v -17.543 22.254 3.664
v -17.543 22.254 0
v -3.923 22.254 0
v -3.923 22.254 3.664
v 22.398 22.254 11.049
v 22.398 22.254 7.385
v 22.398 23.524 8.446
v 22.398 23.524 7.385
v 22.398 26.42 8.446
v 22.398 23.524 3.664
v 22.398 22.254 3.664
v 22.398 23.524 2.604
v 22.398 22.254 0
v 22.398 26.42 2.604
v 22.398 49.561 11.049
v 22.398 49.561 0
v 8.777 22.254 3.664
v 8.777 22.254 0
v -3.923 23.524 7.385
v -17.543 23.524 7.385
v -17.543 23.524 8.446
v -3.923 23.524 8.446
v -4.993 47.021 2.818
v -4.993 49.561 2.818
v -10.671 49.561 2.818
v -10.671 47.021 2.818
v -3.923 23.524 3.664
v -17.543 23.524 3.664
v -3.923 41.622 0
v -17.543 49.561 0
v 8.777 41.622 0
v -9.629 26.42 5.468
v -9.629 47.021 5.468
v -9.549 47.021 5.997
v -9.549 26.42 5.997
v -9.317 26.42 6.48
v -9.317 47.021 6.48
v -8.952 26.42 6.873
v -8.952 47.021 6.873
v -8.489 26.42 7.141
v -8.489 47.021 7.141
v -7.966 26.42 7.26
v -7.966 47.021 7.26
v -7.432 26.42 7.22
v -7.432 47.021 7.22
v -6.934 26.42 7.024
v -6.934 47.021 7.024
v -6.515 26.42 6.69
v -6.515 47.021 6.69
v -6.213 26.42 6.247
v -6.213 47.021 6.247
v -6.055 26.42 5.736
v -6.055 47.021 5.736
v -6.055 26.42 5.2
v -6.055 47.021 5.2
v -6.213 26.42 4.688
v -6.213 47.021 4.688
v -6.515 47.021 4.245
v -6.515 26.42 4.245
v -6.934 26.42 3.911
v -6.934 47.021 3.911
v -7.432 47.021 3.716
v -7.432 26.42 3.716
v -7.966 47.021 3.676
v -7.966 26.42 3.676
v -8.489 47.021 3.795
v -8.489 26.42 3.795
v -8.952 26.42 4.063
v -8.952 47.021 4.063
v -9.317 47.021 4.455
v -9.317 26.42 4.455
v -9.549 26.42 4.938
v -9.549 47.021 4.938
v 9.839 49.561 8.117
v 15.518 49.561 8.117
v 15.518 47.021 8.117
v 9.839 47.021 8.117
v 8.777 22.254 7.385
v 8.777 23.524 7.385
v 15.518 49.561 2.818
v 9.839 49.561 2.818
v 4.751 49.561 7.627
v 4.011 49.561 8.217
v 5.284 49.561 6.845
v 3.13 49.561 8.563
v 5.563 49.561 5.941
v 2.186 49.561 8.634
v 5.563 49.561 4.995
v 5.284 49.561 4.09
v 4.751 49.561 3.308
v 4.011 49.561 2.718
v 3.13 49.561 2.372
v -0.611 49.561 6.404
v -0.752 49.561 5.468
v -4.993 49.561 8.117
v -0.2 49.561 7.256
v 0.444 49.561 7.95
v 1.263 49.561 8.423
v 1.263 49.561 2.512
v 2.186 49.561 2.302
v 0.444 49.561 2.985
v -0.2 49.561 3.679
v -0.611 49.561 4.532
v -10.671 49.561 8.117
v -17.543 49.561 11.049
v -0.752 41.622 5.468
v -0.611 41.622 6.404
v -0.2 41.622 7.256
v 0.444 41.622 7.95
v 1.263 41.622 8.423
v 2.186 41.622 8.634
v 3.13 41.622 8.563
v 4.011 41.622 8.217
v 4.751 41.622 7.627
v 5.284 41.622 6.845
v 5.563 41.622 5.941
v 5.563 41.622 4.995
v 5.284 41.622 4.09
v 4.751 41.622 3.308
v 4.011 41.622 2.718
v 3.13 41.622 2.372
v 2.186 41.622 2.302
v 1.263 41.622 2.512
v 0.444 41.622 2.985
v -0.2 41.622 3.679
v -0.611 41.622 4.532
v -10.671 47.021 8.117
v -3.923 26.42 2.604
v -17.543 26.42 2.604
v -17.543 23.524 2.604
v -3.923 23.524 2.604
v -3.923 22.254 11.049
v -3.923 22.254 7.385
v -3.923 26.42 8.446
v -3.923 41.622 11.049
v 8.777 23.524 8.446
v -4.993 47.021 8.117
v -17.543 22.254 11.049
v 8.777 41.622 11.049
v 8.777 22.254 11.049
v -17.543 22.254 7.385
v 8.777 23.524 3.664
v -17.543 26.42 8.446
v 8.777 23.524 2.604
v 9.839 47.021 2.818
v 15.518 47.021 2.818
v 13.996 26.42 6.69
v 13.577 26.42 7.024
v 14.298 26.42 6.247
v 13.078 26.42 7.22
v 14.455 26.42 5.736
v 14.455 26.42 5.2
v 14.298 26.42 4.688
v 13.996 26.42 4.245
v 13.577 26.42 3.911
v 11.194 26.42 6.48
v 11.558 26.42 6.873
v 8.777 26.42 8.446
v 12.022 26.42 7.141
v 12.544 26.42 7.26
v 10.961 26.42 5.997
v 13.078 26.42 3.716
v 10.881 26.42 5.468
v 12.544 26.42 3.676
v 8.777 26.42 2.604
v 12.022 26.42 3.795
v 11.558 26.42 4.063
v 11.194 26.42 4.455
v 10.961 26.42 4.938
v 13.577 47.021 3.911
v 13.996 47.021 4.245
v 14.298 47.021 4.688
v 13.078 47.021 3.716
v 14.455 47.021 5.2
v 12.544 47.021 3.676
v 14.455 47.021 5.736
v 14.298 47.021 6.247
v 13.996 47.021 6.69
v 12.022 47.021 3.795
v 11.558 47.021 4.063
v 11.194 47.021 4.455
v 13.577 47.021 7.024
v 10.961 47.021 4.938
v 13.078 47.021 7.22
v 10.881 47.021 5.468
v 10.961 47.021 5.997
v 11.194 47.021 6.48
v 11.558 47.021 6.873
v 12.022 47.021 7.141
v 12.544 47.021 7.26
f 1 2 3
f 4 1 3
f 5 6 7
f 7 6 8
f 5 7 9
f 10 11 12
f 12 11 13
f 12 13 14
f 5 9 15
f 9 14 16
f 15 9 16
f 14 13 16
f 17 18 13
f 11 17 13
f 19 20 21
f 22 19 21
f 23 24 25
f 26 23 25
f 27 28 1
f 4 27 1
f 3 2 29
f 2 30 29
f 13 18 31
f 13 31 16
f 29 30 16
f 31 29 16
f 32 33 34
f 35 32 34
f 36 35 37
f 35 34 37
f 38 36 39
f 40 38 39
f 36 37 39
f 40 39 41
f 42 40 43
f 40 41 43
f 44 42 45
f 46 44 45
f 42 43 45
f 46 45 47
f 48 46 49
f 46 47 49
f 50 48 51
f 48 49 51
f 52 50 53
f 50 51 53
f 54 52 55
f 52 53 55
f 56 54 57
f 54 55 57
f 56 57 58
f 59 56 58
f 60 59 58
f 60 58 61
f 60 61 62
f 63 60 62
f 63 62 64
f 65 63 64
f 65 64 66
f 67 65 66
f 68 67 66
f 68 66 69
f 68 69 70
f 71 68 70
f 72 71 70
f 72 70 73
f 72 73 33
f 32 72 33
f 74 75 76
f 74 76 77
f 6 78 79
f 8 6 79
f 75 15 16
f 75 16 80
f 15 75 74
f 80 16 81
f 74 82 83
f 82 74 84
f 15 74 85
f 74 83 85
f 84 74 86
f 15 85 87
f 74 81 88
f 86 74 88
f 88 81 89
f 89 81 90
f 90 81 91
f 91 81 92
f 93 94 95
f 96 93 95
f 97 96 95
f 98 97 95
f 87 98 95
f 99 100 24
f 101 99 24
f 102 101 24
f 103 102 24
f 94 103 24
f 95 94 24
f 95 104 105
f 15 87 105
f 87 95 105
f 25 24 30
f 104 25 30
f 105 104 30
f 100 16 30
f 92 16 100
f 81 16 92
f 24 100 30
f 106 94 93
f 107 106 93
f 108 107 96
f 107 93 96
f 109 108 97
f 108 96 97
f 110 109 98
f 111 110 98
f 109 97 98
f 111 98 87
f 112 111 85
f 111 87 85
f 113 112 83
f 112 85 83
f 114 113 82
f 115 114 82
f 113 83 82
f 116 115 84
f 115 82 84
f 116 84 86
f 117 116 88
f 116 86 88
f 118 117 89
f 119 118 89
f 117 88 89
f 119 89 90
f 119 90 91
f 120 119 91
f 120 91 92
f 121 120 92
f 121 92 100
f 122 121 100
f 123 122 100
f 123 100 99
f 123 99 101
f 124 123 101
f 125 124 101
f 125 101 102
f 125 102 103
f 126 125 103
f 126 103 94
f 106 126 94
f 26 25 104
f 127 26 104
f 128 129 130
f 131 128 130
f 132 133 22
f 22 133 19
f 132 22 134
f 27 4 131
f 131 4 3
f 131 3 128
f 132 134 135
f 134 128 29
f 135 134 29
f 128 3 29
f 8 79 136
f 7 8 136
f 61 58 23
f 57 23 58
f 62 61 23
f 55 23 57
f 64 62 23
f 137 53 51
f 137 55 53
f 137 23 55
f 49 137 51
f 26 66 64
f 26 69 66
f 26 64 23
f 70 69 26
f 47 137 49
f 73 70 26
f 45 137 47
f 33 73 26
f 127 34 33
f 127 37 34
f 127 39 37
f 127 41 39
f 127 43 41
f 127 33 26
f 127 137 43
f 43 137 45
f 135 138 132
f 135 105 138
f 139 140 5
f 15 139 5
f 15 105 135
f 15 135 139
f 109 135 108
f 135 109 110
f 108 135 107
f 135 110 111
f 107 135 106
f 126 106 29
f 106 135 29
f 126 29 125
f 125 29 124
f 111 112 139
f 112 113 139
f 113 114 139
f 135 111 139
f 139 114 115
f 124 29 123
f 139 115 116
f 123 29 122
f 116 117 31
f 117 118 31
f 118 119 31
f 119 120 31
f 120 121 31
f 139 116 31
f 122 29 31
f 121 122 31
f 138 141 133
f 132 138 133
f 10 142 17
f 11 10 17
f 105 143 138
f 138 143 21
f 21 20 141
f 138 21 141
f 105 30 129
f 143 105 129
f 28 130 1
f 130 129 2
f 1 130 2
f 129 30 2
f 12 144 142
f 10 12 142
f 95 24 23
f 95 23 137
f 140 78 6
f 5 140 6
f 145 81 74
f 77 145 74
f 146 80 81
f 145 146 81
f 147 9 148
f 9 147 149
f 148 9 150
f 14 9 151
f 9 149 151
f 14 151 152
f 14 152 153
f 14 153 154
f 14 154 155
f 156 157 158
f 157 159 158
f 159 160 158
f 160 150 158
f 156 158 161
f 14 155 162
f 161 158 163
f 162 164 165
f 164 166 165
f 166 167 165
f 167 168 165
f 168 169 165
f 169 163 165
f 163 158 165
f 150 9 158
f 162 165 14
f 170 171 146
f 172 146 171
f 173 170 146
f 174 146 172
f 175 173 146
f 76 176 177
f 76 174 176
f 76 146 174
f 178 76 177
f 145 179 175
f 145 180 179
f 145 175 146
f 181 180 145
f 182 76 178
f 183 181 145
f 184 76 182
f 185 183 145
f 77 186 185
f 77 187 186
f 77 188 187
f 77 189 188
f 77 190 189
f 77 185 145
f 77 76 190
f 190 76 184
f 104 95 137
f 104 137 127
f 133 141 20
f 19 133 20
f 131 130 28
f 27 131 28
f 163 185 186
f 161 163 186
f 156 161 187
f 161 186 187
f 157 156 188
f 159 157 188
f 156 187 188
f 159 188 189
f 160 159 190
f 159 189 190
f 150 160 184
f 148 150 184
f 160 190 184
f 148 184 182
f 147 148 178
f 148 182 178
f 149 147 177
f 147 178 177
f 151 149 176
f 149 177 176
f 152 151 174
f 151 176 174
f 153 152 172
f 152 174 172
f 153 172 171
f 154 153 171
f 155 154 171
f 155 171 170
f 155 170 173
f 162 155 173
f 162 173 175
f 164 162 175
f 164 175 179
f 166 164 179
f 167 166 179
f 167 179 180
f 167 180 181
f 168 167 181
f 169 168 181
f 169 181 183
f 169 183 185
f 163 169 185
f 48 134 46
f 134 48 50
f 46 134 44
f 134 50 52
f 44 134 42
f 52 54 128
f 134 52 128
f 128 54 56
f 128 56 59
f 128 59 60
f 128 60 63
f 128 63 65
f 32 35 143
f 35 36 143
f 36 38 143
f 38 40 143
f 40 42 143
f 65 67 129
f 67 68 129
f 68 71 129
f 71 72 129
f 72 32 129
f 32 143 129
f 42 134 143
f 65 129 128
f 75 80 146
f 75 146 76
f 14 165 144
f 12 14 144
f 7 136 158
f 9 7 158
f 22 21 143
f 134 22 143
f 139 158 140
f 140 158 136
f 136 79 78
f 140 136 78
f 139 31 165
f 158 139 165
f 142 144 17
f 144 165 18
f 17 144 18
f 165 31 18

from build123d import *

# Parameters (mm, degrees)
F1_DEPTH = 11.049
F3_DEPTH = 39.9425
F4_R     = 3.175
F4_R_2   = 1.79705
F5_DEPTH = 27.307296
F4_W     = 5.678279
F4_H     = 5.299044
F6_DEPTH = 2.54


with BuildPart() as f1:
    # F0 (on Top) → F1 (new body)
    with BuildSketch(Plane.XY):
        Polygon((-17.543431, 48.29058), (-17.543431, 22.254284), (-3.922681, 22.254284), (-3.922681, 26.382432), (-3.922681, 41.622432), (8.777319, 41.622432), (8.777319, 26.382432), (8.777319, 22.254284), (22.398069, 22.254284), (22.398069, 48.29058), (22.398069, 49.56058), (-17.543431, 49.56058), align=None)
    extrude(amount=F1_DEPTH)

    # F2 (on face) → F3 (cut, through all)
    with BuildSketch(Plane(origin=(-17.543431, 0, 0), x_dir=(0, -1, 0), z_dir=(-1, 0, 0))):
        Polygon((-23.524284, 2.794), (-23.524284, 3.66395), (-22.254284, 3.66395), (-22.254284, 7.38505), (-23.524284, 7.38505), (-23.524284, 8.255), (-23.524284, 8.4455), (-26.419884, 8.4455), (-26.419884, 8.255), (-26.419884, 2.794), (-26.419884, 2.6035), (-23.524284, 2.6035), align=None)
    extrude(amount=-F3_DEPTH, mode=Mode.SUBTRACT)

    # F4 (on face) → F5 (cut, through all)
    with BuildSketch(Plane(origin=(0, 49.56058, 0), x_dir=(-1, 0, 0), z_dir=(0, 1, 0))):
        with Locations((-2.423196, 5.467734)):
            Circle(F4_R)
        with Locations((-12.678446, 5.467734)):
            Circle(F4_R_2)
        with Locations((7.832054, 5.467734)):
            Circle(F4_R_2)
    extrude(amount=-F5_DEPTH, mode=Mode.SUBTRACT)

    # F4 (on face) → F6 (cut)
    with BuildSketch(Plane(origin=(0, 49.56058, 0), x_dir=(-1, 0, 0), z_dir=(0, 1, 0))):
        with Locations((-12.678445, 5.467734)):
            Rectangle(F4_W, F4_H)
        with Locations((-12.678446, 5.467734)):
            Circle(F4_R_2, mode=Mode.SUBTRACT)
        with Locations((7.832054, 5.467734)):
            Rectangle(F4_W, F4_H)
        with Locations((7.832054, 5.467734)):
            Circle(F4_R_2, mode=Mode.SUBTRACT)
    extrude(amount=-F6_DEPTH, mode=Mode.SUBTRACT)


solid = f1.part
